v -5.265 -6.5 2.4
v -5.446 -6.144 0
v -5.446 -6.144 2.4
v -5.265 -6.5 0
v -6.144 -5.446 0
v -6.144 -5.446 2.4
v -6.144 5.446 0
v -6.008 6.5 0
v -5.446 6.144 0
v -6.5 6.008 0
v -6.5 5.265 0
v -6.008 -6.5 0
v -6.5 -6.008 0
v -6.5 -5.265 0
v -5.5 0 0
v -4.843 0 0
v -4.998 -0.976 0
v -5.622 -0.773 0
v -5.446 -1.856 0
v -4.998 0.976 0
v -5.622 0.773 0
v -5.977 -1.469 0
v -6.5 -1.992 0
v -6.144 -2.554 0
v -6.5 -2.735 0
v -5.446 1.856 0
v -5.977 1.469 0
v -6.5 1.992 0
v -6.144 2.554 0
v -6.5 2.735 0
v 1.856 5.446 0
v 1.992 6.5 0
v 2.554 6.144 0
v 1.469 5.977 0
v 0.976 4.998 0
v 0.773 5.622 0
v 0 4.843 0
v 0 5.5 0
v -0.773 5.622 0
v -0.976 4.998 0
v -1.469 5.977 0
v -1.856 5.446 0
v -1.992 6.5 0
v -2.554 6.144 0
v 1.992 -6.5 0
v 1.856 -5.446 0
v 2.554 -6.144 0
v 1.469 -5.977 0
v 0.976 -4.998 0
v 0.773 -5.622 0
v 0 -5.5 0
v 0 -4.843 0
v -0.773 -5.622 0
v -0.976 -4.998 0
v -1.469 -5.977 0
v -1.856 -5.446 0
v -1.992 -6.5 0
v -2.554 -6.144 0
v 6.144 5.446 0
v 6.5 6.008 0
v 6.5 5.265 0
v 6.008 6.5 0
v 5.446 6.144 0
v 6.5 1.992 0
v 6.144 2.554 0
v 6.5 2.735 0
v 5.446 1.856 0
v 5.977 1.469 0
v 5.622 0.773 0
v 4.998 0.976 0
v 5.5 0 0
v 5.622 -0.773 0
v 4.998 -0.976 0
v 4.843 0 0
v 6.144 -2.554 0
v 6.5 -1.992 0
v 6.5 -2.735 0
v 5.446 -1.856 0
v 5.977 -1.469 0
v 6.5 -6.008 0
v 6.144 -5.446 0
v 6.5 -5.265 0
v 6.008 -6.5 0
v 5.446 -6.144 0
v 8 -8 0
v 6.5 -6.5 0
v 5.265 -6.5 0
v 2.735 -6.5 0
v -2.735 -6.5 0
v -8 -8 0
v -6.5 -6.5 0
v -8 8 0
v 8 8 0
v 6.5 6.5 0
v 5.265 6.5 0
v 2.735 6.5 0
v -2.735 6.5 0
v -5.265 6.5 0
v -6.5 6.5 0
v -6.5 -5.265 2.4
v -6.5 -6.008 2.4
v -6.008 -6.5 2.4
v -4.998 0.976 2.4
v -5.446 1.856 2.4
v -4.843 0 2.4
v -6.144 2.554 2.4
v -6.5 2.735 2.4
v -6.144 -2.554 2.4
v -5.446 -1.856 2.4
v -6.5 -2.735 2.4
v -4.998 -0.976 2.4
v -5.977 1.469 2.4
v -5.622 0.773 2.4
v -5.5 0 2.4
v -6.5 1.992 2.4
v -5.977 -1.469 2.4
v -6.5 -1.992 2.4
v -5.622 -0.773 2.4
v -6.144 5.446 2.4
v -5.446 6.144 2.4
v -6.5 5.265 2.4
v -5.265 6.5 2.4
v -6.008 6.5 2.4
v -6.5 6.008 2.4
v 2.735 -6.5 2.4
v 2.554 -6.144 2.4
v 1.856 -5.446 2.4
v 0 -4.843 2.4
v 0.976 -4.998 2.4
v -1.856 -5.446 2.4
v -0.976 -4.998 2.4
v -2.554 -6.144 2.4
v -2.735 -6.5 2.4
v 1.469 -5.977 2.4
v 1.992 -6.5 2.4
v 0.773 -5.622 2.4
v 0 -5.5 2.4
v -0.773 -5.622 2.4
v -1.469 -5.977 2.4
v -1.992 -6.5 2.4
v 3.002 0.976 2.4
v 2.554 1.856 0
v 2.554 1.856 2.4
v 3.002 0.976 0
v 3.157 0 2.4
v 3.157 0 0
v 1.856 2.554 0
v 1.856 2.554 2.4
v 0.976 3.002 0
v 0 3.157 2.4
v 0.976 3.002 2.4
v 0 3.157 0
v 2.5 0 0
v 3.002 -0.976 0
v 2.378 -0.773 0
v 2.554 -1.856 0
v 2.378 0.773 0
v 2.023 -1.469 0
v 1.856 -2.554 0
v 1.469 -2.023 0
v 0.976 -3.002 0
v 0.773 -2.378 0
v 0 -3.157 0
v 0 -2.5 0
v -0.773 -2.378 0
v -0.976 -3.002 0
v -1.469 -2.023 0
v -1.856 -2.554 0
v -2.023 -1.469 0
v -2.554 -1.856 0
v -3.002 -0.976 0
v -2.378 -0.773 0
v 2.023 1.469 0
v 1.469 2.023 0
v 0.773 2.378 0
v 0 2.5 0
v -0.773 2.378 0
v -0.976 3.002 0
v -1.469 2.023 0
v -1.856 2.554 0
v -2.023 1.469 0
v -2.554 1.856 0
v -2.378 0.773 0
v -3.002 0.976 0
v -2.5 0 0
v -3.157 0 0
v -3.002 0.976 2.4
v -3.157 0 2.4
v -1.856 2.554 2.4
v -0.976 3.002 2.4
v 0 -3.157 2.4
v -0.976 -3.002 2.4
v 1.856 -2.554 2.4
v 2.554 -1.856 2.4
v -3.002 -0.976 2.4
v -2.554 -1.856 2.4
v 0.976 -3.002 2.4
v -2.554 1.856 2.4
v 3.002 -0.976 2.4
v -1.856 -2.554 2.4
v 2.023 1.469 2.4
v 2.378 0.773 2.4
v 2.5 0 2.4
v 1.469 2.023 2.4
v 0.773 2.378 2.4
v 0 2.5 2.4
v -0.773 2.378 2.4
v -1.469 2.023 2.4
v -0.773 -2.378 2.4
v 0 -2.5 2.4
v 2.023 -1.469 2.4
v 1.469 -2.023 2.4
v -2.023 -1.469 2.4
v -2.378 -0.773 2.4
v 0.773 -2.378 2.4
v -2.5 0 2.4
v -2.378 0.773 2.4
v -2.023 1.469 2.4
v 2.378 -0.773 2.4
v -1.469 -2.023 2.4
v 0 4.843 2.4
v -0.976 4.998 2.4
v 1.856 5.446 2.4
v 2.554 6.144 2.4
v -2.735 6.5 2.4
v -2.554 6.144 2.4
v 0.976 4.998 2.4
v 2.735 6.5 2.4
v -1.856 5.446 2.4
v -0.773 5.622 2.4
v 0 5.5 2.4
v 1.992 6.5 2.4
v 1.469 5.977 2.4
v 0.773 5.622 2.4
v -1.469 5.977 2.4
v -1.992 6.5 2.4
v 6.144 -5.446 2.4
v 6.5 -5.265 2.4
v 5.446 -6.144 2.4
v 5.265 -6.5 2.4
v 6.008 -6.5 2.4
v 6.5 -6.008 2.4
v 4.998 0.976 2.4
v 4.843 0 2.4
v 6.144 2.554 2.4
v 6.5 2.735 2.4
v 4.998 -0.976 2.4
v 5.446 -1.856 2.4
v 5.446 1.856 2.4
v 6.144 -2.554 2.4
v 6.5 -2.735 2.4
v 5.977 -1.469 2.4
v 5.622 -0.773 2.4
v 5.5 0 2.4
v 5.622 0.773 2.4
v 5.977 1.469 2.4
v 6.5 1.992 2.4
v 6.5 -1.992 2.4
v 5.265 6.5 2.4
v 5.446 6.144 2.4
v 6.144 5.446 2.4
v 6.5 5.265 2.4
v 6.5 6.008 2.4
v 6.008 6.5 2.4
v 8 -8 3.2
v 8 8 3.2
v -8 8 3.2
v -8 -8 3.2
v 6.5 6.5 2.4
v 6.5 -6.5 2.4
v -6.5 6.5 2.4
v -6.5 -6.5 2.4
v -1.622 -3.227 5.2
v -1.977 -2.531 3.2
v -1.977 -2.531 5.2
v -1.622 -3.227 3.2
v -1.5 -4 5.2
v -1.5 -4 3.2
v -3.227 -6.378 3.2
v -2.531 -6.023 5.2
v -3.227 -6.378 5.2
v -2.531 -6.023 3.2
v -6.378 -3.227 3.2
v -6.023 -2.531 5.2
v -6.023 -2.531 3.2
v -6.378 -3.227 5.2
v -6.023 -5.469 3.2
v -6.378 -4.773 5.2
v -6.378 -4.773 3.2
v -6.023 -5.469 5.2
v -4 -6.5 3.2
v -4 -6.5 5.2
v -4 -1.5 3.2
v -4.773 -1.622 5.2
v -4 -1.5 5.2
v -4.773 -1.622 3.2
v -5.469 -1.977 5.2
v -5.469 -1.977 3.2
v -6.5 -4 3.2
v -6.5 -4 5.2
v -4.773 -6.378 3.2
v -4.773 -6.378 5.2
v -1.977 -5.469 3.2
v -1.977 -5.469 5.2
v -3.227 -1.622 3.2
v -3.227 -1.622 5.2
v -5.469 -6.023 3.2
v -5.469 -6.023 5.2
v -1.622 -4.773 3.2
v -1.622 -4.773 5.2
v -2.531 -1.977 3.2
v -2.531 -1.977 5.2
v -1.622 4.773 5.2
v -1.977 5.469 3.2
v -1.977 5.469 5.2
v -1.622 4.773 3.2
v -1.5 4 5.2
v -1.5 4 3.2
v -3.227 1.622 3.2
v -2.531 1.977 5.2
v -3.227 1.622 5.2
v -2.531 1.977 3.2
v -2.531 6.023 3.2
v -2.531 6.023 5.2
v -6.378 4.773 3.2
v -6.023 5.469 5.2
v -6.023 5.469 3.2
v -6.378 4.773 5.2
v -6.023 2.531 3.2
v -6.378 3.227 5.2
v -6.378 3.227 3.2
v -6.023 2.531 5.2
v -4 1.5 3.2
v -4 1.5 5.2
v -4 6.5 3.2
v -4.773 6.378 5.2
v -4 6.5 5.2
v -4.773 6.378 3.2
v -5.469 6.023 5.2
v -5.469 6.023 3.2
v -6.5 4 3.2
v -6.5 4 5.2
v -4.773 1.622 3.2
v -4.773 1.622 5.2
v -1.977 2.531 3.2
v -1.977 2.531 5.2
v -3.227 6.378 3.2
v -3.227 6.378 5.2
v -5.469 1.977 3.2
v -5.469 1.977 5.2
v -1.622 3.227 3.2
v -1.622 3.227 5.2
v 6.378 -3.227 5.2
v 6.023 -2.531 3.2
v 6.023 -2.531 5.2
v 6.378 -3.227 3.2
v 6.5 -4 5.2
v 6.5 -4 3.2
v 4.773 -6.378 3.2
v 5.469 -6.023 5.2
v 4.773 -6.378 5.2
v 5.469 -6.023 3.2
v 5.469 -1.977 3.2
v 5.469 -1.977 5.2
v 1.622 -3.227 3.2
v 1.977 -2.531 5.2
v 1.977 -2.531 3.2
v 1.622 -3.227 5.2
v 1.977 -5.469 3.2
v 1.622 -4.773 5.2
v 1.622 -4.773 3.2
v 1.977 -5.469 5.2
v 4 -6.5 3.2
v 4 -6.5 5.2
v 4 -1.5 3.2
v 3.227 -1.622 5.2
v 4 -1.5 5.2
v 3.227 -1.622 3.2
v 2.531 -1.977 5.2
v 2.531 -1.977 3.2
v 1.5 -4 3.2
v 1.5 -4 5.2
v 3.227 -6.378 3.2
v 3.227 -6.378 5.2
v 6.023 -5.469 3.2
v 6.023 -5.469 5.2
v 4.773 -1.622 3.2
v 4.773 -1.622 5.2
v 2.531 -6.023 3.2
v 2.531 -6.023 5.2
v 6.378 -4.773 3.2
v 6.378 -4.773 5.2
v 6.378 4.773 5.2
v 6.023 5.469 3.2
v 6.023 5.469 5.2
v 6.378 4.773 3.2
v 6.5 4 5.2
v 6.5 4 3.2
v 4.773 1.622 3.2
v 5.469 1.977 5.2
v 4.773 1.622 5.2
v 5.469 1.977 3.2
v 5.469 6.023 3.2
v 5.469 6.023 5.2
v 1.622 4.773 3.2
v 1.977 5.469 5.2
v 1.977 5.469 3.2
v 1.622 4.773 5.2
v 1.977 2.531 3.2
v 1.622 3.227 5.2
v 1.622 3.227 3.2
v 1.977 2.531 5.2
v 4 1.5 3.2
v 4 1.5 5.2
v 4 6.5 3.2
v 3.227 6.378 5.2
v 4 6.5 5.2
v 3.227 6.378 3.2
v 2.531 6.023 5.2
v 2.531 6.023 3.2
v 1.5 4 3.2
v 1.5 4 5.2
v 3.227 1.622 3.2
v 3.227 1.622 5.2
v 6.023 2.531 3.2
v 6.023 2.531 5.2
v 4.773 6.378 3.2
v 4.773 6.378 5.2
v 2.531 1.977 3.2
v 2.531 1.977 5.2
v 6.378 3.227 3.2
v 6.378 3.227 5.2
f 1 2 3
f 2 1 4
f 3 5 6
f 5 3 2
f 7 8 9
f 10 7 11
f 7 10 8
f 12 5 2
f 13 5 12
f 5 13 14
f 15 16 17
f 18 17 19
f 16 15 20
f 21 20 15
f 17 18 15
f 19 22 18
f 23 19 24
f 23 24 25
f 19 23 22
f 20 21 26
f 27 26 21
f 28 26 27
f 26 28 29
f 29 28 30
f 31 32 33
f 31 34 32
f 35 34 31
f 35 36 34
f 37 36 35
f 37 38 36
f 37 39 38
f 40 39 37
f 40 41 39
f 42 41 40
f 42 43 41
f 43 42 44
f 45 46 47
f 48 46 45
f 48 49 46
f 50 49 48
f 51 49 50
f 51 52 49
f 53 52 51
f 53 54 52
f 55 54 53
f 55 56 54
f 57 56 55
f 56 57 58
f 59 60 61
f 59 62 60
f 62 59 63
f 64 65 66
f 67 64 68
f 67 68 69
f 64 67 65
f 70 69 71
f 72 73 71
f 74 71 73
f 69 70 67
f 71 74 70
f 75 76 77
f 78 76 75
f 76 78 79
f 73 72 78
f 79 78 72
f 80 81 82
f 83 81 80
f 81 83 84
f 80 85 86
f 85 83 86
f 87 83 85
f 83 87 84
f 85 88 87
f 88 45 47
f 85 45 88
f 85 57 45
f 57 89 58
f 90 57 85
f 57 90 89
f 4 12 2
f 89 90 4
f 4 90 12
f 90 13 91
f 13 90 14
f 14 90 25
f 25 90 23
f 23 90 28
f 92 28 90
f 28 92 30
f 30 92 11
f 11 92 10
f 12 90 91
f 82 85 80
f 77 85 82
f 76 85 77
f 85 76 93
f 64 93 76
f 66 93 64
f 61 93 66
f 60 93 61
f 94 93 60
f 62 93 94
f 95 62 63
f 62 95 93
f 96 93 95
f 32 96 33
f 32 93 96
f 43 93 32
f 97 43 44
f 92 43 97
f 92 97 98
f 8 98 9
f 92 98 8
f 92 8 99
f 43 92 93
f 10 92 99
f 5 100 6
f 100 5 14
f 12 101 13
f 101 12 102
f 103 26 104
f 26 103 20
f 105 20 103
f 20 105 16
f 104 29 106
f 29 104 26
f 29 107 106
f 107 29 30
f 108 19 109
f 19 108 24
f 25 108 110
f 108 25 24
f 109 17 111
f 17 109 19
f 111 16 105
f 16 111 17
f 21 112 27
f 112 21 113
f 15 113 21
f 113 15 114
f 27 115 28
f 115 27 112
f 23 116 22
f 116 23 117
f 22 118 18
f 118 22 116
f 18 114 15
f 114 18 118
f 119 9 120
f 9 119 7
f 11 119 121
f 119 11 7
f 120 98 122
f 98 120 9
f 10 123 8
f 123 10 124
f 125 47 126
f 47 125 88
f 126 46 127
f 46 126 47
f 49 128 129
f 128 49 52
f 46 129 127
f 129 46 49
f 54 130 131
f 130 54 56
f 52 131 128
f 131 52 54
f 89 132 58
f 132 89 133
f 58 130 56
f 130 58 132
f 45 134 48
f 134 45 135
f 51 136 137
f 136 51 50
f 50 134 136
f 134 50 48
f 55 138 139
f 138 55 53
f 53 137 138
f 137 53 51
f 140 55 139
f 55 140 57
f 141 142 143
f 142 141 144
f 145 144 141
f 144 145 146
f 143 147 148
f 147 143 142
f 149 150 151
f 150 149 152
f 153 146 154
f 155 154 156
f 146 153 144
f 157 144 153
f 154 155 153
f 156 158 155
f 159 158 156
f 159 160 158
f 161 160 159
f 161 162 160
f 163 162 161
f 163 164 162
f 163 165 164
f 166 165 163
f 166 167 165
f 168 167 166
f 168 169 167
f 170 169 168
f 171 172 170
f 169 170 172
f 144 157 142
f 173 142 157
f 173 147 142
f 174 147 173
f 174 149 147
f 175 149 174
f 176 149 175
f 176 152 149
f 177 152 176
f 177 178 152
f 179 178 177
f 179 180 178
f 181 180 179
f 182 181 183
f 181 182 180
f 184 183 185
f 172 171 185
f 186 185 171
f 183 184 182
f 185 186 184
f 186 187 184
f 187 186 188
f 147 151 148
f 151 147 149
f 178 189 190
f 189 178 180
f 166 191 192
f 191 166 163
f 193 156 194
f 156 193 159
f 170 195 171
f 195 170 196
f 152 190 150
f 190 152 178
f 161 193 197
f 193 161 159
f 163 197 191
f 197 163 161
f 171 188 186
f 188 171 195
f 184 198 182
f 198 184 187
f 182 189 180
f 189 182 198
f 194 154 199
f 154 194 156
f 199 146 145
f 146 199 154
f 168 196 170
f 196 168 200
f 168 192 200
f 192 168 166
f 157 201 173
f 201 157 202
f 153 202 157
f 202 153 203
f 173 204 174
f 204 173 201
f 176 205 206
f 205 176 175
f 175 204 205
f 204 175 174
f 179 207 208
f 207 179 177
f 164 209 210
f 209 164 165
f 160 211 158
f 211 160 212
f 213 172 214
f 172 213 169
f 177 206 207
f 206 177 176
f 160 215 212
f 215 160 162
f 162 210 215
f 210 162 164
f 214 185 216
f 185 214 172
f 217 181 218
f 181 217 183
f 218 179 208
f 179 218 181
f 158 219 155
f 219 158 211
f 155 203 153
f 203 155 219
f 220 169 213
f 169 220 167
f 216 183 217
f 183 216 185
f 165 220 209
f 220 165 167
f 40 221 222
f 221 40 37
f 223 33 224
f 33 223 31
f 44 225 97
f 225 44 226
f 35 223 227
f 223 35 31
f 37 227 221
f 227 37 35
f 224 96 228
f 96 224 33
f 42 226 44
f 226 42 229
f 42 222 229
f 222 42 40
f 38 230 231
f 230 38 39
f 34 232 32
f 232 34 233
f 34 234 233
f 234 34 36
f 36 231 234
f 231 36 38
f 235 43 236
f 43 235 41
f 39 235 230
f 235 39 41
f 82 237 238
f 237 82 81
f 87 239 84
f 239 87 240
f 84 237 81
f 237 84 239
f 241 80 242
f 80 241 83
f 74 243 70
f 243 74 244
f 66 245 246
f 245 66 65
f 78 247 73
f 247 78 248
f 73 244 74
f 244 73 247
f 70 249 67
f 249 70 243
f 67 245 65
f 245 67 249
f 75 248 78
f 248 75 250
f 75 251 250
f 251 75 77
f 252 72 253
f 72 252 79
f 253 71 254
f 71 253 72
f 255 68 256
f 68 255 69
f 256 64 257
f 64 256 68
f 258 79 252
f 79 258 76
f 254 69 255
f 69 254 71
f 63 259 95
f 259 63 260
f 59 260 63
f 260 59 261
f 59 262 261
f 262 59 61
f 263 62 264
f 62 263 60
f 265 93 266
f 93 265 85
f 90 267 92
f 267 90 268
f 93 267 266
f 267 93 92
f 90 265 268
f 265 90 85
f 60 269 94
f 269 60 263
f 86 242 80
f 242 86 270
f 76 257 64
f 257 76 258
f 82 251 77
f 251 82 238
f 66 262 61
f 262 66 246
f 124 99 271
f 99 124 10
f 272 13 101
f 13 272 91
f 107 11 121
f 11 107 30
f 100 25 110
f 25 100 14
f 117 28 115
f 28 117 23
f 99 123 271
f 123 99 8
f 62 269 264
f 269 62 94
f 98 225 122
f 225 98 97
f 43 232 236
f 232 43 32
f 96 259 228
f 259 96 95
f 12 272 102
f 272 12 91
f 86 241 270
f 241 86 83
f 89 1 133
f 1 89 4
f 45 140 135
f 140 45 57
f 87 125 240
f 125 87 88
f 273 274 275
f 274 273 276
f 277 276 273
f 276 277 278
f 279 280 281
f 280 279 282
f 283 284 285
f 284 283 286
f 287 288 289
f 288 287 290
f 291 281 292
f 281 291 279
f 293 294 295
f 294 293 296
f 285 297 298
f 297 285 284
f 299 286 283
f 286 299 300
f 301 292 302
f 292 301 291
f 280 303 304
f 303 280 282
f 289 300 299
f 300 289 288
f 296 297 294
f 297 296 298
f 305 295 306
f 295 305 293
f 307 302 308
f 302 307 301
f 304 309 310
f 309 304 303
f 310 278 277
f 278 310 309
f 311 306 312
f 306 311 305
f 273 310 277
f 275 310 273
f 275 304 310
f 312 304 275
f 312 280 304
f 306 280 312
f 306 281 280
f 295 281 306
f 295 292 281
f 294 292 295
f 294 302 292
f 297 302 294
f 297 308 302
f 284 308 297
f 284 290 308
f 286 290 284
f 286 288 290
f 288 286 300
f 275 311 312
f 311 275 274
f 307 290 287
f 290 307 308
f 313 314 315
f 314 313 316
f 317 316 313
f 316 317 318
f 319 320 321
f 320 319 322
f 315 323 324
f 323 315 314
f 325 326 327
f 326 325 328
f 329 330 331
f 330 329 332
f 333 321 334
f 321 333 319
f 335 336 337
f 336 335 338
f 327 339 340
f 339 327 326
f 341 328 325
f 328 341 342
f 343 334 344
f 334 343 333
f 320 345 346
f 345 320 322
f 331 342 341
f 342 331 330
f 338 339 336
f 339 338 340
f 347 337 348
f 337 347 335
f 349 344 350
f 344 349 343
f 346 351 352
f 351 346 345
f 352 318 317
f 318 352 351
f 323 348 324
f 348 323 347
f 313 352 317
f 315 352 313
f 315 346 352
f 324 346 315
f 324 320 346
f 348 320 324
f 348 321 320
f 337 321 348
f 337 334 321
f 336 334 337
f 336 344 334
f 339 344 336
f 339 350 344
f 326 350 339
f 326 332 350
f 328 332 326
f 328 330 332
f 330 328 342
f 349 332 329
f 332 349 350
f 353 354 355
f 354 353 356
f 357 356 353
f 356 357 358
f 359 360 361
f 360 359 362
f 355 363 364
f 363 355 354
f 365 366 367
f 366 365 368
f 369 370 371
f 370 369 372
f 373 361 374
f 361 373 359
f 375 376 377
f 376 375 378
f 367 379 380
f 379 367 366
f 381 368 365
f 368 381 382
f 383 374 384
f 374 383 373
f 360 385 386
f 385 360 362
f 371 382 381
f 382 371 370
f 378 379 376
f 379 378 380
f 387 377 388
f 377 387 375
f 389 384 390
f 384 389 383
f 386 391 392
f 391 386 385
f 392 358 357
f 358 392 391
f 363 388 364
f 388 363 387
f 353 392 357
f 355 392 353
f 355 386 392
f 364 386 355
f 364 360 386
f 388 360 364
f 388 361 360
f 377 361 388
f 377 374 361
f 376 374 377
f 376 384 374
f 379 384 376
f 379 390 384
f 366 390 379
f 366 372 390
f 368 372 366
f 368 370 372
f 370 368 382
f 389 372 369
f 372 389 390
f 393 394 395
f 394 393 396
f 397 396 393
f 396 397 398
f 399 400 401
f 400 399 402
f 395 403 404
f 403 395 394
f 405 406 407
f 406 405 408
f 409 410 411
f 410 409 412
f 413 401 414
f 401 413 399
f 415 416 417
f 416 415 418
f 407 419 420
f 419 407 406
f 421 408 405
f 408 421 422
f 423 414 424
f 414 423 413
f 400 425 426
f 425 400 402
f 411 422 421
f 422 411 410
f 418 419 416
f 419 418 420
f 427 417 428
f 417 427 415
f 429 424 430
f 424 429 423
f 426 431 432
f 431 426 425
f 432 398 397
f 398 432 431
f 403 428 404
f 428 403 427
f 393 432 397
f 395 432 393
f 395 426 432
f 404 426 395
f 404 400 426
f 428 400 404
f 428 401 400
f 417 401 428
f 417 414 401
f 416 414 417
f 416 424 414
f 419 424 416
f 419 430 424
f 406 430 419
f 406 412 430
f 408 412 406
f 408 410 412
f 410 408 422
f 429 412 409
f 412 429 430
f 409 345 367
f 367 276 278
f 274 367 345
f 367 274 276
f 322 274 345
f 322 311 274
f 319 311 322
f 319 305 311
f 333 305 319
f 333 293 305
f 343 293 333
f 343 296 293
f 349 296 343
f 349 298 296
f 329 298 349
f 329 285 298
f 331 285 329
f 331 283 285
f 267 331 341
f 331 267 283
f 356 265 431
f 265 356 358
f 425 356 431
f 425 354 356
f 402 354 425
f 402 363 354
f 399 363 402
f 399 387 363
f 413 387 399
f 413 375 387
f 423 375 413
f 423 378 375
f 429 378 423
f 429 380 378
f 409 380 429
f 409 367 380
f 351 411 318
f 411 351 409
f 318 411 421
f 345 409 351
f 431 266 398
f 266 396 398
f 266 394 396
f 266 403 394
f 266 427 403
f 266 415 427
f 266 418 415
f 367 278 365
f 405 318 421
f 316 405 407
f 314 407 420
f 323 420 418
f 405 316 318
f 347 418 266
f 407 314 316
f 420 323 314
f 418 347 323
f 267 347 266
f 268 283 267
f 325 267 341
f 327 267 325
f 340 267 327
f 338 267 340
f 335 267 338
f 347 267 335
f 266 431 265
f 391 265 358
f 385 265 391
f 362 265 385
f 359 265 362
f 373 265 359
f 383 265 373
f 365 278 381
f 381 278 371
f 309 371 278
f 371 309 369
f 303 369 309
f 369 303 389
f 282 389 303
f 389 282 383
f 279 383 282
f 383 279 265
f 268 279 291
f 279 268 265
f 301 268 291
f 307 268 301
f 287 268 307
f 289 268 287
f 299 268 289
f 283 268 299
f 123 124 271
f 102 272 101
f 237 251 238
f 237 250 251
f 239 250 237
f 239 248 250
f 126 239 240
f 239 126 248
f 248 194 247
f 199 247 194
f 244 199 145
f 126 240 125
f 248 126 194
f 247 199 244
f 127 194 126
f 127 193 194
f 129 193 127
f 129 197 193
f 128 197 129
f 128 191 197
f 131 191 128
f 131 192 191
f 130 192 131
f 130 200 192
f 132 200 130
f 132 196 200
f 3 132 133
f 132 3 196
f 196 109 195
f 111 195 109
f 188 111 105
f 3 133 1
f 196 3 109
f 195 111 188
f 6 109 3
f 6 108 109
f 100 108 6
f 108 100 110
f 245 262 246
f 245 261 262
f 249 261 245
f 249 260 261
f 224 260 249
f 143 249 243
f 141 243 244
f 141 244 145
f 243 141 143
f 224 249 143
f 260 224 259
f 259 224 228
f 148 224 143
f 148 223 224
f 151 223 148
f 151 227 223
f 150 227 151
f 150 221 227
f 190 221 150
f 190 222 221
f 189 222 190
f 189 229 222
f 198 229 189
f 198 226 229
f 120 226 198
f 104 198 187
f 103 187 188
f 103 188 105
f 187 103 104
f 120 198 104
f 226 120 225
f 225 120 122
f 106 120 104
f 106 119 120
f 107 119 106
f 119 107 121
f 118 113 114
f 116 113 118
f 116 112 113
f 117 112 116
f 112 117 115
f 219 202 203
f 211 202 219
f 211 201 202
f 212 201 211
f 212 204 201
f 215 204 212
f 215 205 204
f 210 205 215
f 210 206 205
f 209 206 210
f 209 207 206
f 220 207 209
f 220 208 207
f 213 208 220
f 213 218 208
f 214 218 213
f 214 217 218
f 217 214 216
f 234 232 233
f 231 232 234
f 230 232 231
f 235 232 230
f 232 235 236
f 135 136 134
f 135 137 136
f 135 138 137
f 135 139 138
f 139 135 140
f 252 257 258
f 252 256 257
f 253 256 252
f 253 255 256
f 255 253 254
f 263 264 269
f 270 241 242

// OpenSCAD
// file: bricks.scad
// Copyright 2013 Jonathan Hulka
// This program is free software; you can redistribute it and/or modify
// it under the terms of the GNU General Public License as published by
// the Free Software Foundation; either version 2 of the License, or
// (at your option) any later version.
// 
// This program is distributed in the hope that it will be useful,
// but WITHOUT ANY WARRANTY; without even the implied warranty of
// MERCHANTABILITY or FITNESS FOR A PARTICULAR PURPOSE.  See the
// GNU General Public License for more details.
// 
// You should have received a copy of the GNU General Public License
// along with this program; if not, write to the Free Software
// Foundation, Inc., 51 Franklin Street, Fifth Floor, Boston,
// MA 02110-1301, USA.


peg_space=8;
peg_radius=2.5;
peg_height=2;
peg_allowance=0.4; //Extra space for pegs in bottom of a brick of height 1
brick_height=3.2; //This is the flat brick
peg_diagonal_space=peg_space*sqrt(2);
//rod_radius=2;
$fn=20;
//left edge: x=0;
//top edge: y=0;
//peg bottom: z=0;
//The platform sits below the z axis
module brick_top(pegs_x,pegs_y)
{
//	difference()
//	{
		union()
		{
			//Pegs extend 0.2mm down into the platform to ensure connection
			for(i=[0:pegs_x-1], j=[0:pegs_y-1])
				translate([(0.5 + i)*peg_space, (0.5 + j)*peg_space,peg_height/2-0.1])
					cylinder(h=peg_height+0.2,r=peg_radius,center=true);
			//The platform sits just under the z-axis
			translate([pegs_x*peg_space/2,pegs_y*peg_space/2,-(brick_height-peg_height-peg_allowance)/2])
				cube(size=[pegs_x*peg_space,pegs_y*peg_space,brick_height-peg_height-peg_allowance],center=true);
		}
//		for(i=[0:pegs_x-1], j=[0:pegs_y-1])
//			translate([(0.5 + i)*peg_space, (0.5 + j)*peg_space,0])
//				cylinder(h=10,r=rod_radius,center=true);
//	}
}

module brick_bottom_cylinders(pegs_x,pegs_y,height,filled=false)
{
	intersection()
	{
		for(i=[0:pegs_x], j=[0:pegs_y])
		{
			translate([i*peg_space,j*peg_space,height/2])
			
			if(filled)
			{
				cylinder(h=height,r=(peg_diagonal_space-peg_radius*2)/2,center=true);
			}
			else
			{
				difference()
				{
					cylinder(h=height,r=(peg_diagonal_space-peg_radius*2)/2,center=true);
					cylinder(h=height+1,r=peg_radius,center=true);
				}
			}
		}
		translate([pegs_x/2*peg_space,pegs_y/2*peg_space,height/2])
		cube(size=[pegs_x*peg_space,pegs_y*peg_space,height+1],center=true);
	}	
}

module brick_bottom_edges(pegs_x,pegs_y,height)
{
	translate([peg_space*pegs_x/2,peg_space*pegs_y/2,height/2]) difference()
	{
		cube(size=[peg_space*pegs_x,peg_space*pegs_y,height],center=true);
		cube(size=[peg_space*(pegs_x-1)+peg_radius*2,peg_space*(pegs_y-1)+peg_radius*2,height+1],center=true);
	}
}

module simple_brick(pegs_x,pegs_y,bricks_z)
{
	union()
	{
		translate([-peg_space*pegs_x/2,-peg_space*pegs_y/2,0])
		{
			brick_bottom_cylinders(pegs_x,pegs_y,brick_height*bricks_z);
			brick_bottom_edges(pegs_x,pegs_y,brick_height*bricks_z);
		}
		translate([-peg_space*pegs_x/2,-peg_space*pegs_y/2,brick_height*bricks_z]) brick_top(pegs_x,pegs_y);
	}
}
// main file
// Copyright 2013 Jonathan Hulka
// This program is free software; you can redistribute it and/or modify
// it under the terms of the GNU General Public License as published by
// the Free Software Foundation; either version 2 of the License, or
// (at your option) any later version.
// 
// This program is distributed in the hope that it will be useful,
// but WITHOUT ANY WARRANTY; without even the implied warranty of
// MERCHANTABILITY or FITNESS FOR A PARTICULAR PURPOSE.  See the
// GNU General Public License for more details.
// 
// You should have received a copy of the GNU General Public License
// along with this program; if not, write to the Free Software
// Foundation, Inc., 51 Franklin Street, Fifth Floor, Boston,
// MA 02110-1301, USA.

include <bricks.scad>;
//brick_top(pegs_x=2,pegs_y=6);
//brick_bottom(pegs_x=4,pegs_y=3);
demo(1);


module demo(n)
{
	if(n==1)
	{
//Demo 1 - a boring brick
		simple_brick(2,2,1);
	}
	else if(n==2)
	{
//Demo 2 - cookie cutter
		intersection()
		{
			simple_brick(3,3,3);
			cylinder(h=brick_height*7,r=peg_space*1.5,center=true);
		}
	}
	else if(n==2.5)
	{
//Demo 2.5 - smaller cookie cutter
		intersection()
		{
			simple_brick(2,2,3);
			cylinder(h=brick_height*7,r=peg_space,center=true);
		}
	}
	else if(n==3)
	{
//Demo 3 - cookie cutter dressed up
		intersection()
		{
			union()
			{
				simple_brick(3,3,3);
				difference()
				{
					translate([0,0,brick_height*1.5])
						cylinder(h=brick_height*3,r=peg_space*1.5,center=true);
					translate([0,0,brick_height-1])
						cylinder(h=brick_height*2,r=peg_space*1+peg_radius,center=true);
					translate([0,0,-brick_height*3])simple_brick(3,3,3);
				}
			}
			cylinder(h=brick_height*7,r=peg_space*1.5,center=true);
		}
	}
	else if(n==3.5)
	{
//Demo 3.5 - smaller cookie cutter dressed up
		intersection()
		{
			union()
			{
				simple_brick(2,2,3);
				difference()
				{
					translate([0,0,brick_height*1.5])
						cylinder(h=brick_height*3,r=peg_space,center=true);
#					translate([0,0,brick_height-1])
						cylinder(h=brick_height*2,r=peg_space*0.5+peg_radius,center=true);
#					translate([0,0,-brick_height*3])simple_brick(2,2,3);
				}
			}
			cylinder(h=brick_height*7,r=peg_space,center=true);
		}
	}
	else if(n==4)
	{
//Demo 4 - with a twist
		translate(30,30,0)union()
		{
			intersection()
			{
				union()
				{
			rotate(a=30)translate([-peg_space,-peg_space*2,brick_height*3]) brick_top(pegs_x=2,pegs_y=4);
					translate([-peg_space,-peg_space*2,0])
					{
						brick_bottom_cylinders(pegs_x=2,pegs_y=4,height=peg_height*2);
						brick_bottom_edges(pegs_x=2,pegs_y=4,height=peg_height*2);
					}
					translate([0,0,(brick_height*3+peg_allowance+peg_height)/2])
					cylinder(h=brick_height*3-peg_allowance-peg_height,r=sqrt(peg_space*peg_space*5),center=true);
				}
				union()
				{
					translate([0,0,peg_height/2-0.5+brick_height*3])
						cylinder(h=peg_height+1,r=sqrt(peg_space*peg_space*5),center=true);
					translate([0,0,brick_height*3/2])
						linear_extrude(height=brick_height*3,twist=-30,slices=75,center=true)
						polygon([
							[-peg_space,-2*peg_space],
							[-peg_space,2*peg_space],
							[peg_space,2*peg_space],
							[peg_space,-2*peg_space]]);
				}
			}
		}
	}
//Demo 5 - two sided
	else if(n==5)
	{
		union()
		{
			translate([-peg_space,-peg_space*2,0])
			union()
			{
				mirror([0,0,-1])brick_top(pegs_x=2,pegs_y=4);
				translate([0,0,brick_height*3]) brick_top(pegs_x=2,pegs_y=4);
			}
			translate([0,0,brick_height*3/2])cube(size=[peg_space*2,peg_space*4,brick_height*3],center=true);
		}
	}
}
